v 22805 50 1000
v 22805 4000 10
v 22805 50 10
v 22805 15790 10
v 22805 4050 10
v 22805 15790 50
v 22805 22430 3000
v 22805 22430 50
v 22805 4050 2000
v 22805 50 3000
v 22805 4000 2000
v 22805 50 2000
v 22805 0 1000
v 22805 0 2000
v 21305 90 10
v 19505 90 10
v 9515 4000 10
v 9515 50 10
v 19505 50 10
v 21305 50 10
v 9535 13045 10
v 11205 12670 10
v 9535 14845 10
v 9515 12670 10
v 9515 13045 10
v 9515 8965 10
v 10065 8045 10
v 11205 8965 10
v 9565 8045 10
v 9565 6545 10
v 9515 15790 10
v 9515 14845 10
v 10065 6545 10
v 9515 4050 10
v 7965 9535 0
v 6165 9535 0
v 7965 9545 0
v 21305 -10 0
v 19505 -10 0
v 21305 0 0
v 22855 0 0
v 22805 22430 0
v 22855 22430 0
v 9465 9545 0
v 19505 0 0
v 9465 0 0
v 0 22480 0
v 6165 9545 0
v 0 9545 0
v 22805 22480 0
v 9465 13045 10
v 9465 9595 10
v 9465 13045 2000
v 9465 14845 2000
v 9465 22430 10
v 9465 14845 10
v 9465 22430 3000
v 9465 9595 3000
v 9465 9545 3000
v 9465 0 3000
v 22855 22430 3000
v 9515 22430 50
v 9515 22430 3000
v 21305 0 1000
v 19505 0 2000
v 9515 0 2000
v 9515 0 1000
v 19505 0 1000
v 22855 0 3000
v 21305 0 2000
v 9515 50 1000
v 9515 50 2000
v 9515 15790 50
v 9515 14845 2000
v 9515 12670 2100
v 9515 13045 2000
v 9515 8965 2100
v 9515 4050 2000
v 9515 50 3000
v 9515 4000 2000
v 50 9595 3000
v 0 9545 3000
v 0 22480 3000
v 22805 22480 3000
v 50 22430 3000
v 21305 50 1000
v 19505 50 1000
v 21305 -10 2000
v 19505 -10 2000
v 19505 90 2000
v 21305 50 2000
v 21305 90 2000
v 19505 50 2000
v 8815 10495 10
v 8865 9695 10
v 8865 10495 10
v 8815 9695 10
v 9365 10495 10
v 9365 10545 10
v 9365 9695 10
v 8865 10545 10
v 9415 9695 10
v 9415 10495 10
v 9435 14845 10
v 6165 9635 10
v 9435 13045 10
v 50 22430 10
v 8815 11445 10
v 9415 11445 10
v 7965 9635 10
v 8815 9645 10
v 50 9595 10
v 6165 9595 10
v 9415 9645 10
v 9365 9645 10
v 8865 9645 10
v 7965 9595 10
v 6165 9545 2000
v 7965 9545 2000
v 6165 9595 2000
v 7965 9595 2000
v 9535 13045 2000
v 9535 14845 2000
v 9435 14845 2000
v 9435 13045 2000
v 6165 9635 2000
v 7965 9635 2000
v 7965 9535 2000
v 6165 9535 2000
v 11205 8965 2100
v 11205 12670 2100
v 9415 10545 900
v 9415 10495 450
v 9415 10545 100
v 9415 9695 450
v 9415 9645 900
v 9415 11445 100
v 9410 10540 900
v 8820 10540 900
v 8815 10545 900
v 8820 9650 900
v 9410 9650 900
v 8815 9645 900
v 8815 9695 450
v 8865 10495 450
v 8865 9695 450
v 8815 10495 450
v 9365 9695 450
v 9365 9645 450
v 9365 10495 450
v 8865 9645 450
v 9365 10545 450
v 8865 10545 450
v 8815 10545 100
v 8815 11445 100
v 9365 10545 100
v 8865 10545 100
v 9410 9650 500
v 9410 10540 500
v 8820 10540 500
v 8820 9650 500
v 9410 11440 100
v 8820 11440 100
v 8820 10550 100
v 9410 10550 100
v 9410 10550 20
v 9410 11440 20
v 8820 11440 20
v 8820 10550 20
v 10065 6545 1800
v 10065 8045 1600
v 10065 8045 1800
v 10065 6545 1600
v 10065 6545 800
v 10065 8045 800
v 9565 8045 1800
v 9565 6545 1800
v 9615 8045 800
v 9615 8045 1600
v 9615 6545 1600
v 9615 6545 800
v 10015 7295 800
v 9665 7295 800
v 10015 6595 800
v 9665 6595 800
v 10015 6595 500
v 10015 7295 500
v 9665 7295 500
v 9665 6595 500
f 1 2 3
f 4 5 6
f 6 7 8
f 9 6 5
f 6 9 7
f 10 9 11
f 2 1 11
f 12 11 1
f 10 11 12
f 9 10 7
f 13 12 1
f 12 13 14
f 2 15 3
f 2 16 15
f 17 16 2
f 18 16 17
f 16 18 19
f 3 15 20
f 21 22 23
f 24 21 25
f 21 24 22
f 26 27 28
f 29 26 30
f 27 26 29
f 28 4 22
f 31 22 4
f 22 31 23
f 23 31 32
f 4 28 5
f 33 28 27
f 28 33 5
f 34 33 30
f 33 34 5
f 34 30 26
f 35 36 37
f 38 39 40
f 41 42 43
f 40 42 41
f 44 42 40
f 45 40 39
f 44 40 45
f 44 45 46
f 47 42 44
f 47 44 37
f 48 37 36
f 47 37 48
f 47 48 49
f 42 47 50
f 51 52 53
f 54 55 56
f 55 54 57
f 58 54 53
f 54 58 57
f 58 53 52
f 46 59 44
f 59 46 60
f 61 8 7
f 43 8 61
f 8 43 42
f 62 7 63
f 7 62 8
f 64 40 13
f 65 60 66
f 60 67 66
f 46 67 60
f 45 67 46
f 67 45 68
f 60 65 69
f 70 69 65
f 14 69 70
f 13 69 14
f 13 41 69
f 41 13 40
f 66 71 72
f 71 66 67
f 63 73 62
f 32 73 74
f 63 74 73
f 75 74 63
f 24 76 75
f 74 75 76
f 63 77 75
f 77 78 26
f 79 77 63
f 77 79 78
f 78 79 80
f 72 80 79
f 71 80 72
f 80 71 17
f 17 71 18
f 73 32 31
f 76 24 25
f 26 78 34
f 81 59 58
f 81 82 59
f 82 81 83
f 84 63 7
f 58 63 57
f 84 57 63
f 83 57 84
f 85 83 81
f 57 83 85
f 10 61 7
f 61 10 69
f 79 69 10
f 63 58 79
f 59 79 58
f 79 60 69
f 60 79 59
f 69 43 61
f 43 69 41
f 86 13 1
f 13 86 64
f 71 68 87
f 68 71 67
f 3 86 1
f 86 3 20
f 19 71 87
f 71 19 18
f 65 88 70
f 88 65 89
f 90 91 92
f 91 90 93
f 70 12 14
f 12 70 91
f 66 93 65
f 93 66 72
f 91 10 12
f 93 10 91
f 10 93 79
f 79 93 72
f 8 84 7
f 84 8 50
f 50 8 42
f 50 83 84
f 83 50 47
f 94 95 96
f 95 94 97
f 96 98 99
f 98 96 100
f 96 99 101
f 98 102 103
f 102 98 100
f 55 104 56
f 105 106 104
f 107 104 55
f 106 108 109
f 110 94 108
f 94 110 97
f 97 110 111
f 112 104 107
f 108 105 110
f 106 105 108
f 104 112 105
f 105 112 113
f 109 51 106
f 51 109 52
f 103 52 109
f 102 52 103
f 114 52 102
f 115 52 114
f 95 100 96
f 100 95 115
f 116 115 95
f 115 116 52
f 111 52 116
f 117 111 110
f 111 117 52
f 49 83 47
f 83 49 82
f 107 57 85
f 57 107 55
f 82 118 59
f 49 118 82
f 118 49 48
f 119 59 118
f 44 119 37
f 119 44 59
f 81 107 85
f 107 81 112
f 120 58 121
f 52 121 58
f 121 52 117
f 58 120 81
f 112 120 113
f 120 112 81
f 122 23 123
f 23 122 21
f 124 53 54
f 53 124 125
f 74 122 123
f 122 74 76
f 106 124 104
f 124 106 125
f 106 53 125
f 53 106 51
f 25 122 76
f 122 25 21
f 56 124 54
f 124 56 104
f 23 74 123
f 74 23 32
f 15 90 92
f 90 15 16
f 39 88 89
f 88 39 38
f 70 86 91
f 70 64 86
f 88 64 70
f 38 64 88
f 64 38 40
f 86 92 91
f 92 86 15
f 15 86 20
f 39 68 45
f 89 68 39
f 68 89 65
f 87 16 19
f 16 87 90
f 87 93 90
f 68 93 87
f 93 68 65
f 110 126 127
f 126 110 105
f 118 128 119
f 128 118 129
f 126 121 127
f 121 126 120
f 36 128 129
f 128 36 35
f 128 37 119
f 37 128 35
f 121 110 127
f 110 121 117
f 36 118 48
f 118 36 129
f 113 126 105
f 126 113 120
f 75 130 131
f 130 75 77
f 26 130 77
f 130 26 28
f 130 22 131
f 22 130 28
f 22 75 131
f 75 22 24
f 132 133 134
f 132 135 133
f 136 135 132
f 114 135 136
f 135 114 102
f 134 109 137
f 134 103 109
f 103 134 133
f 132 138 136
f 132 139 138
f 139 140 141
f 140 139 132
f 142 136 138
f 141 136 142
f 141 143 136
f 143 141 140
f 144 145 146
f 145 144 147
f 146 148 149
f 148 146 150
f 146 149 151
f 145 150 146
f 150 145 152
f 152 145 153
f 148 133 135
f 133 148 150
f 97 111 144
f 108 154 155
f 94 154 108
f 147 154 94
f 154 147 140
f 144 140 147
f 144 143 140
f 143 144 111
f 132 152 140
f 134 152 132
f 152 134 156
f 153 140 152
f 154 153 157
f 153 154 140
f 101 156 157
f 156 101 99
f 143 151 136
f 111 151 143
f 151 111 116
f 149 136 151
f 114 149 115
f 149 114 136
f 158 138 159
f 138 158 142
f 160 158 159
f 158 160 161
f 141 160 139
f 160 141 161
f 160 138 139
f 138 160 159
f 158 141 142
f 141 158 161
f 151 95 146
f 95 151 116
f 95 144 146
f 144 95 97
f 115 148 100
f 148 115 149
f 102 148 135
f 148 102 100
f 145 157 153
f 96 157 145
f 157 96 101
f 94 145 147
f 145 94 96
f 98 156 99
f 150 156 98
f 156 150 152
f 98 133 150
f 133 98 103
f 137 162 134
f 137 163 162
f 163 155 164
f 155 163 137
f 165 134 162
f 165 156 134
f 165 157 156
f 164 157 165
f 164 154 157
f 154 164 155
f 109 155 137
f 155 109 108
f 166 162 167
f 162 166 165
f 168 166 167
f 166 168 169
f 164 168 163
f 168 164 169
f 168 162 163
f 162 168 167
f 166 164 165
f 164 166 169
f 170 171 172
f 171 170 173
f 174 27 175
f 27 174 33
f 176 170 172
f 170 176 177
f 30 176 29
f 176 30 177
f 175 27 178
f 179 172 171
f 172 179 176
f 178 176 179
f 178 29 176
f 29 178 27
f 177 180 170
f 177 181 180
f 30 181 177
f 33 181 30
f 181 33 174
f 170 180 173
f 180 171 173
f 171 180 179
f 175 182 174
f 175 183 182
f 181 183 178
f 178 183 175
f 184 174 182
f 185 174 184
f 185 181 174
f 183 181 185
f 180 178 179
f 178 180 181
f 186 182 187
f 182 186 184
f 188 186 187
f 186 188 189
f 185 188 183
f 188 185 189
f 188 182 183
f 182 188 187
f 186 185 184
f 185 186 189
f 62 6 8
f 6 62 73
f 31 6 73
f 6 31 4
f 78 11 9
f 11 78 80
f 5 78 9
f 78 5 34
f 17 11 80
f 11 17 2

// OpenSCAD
//
//
//


//toilet size
tx = 1235;
ty = 1690;
//souko size
sx = 9465;
sy = 12885;
//jimsho size
jx = 13340;
jy = 2140+13650+6640; 
jz = 3000;
//diff
dy = jy-sy;
//
//
//
translate([9465, 0,0]) big_building(jx, jy, jz);
translate([0,2140+13650+6640-12885,0])souko(sx, sy, 3000);

translate ([sx-30, dy+3500, 0]) both_door();
translate ([sx+jx-1500, -10, 0]) rotate([0,0, 90]) both_door();
translate ([sx-1500, dy-10, 0]) rotate([0,0, 90]) both_door();

translate([sx+ty+50, -500, 0])rotate([0,0,90]) toilet_space();

translate([sx, jy-6640, 0])color("black")cube([jx, 6640, 50]);
//間仕切
translate([sx, 4000,0]) color("white")cube([jx, 50, jz-1000]);
translate([sx-650, dy+100, 0])sink_area();
translate([sx+100, dy-3000,0]) mini_kichen();


module big_building(x, y, h){
  cube([x, y, 10]);
  cube([50, y, h]);
  translate([x, 0, 0])cube([50, y, h]);
  translate([0, 0, 0])cube([x, 50, h/3]);
  translate([0, 0, h*2/3])cube([x, 50, h/3]);
  translate([0, y, 0])cube([x, 50, h]);
}

module souko(x, y, h){
  cube([x, y, 10]);
  translate([0, 0, 0])cube([50, y, h]);
  translate([0, 0, 0])cube([x, 50, h]);
  translate([0, y, 0])cube([x, 50, h]);
}

module toilet(){
  color("white") cube([1235, 1690, 2100]);
}

module both_door(){
  color("silver"){
    cube([100, 900, 2000]);
    translate([0, 900, 0])cube([100,900,2000]);
  }
}

module toilet_space(){
  translate([sx, 0,0]) toilet();
  translate([sx+tx, 0,0]) toilet();
  translate([sx+tx*2, 0,0]) toilet();
}

module sink_area(){
  color("silver"){
  //sink 
  //translate([0,900,0])
  union(){
  translate([0,0,450])
  difference(){
    translate([0,0,0]) cube([600, 900, 450]);
    translate([5,5,50]) cube([590, 890, 450]);
  }
  for(i=[0:850:900]){
    translate([0, i, 0]) cube([50,50,450]);
    translate([550, i, 0]) cube([50,50,450]);
  }
  }
  //pan
  translate([0,900,0])
  difference(){
    translate([0,0,0]) cube([600, 900, 100]);
    translate([5,5,20]) cube([590, 890, 100]);
  }
  }
}

module mini_kichen(){
  color("silver"){
    difference(){
      cube([500, 1500, 1800]);
      translate([50, -50, 800]) cube([500, 1600, 800]);
      translate([100, 50, 500]) cube([350, 700, 350]);
    }
  }
}

module locker_toilet(){
  cube([1850, 3650, 2625]);
}
